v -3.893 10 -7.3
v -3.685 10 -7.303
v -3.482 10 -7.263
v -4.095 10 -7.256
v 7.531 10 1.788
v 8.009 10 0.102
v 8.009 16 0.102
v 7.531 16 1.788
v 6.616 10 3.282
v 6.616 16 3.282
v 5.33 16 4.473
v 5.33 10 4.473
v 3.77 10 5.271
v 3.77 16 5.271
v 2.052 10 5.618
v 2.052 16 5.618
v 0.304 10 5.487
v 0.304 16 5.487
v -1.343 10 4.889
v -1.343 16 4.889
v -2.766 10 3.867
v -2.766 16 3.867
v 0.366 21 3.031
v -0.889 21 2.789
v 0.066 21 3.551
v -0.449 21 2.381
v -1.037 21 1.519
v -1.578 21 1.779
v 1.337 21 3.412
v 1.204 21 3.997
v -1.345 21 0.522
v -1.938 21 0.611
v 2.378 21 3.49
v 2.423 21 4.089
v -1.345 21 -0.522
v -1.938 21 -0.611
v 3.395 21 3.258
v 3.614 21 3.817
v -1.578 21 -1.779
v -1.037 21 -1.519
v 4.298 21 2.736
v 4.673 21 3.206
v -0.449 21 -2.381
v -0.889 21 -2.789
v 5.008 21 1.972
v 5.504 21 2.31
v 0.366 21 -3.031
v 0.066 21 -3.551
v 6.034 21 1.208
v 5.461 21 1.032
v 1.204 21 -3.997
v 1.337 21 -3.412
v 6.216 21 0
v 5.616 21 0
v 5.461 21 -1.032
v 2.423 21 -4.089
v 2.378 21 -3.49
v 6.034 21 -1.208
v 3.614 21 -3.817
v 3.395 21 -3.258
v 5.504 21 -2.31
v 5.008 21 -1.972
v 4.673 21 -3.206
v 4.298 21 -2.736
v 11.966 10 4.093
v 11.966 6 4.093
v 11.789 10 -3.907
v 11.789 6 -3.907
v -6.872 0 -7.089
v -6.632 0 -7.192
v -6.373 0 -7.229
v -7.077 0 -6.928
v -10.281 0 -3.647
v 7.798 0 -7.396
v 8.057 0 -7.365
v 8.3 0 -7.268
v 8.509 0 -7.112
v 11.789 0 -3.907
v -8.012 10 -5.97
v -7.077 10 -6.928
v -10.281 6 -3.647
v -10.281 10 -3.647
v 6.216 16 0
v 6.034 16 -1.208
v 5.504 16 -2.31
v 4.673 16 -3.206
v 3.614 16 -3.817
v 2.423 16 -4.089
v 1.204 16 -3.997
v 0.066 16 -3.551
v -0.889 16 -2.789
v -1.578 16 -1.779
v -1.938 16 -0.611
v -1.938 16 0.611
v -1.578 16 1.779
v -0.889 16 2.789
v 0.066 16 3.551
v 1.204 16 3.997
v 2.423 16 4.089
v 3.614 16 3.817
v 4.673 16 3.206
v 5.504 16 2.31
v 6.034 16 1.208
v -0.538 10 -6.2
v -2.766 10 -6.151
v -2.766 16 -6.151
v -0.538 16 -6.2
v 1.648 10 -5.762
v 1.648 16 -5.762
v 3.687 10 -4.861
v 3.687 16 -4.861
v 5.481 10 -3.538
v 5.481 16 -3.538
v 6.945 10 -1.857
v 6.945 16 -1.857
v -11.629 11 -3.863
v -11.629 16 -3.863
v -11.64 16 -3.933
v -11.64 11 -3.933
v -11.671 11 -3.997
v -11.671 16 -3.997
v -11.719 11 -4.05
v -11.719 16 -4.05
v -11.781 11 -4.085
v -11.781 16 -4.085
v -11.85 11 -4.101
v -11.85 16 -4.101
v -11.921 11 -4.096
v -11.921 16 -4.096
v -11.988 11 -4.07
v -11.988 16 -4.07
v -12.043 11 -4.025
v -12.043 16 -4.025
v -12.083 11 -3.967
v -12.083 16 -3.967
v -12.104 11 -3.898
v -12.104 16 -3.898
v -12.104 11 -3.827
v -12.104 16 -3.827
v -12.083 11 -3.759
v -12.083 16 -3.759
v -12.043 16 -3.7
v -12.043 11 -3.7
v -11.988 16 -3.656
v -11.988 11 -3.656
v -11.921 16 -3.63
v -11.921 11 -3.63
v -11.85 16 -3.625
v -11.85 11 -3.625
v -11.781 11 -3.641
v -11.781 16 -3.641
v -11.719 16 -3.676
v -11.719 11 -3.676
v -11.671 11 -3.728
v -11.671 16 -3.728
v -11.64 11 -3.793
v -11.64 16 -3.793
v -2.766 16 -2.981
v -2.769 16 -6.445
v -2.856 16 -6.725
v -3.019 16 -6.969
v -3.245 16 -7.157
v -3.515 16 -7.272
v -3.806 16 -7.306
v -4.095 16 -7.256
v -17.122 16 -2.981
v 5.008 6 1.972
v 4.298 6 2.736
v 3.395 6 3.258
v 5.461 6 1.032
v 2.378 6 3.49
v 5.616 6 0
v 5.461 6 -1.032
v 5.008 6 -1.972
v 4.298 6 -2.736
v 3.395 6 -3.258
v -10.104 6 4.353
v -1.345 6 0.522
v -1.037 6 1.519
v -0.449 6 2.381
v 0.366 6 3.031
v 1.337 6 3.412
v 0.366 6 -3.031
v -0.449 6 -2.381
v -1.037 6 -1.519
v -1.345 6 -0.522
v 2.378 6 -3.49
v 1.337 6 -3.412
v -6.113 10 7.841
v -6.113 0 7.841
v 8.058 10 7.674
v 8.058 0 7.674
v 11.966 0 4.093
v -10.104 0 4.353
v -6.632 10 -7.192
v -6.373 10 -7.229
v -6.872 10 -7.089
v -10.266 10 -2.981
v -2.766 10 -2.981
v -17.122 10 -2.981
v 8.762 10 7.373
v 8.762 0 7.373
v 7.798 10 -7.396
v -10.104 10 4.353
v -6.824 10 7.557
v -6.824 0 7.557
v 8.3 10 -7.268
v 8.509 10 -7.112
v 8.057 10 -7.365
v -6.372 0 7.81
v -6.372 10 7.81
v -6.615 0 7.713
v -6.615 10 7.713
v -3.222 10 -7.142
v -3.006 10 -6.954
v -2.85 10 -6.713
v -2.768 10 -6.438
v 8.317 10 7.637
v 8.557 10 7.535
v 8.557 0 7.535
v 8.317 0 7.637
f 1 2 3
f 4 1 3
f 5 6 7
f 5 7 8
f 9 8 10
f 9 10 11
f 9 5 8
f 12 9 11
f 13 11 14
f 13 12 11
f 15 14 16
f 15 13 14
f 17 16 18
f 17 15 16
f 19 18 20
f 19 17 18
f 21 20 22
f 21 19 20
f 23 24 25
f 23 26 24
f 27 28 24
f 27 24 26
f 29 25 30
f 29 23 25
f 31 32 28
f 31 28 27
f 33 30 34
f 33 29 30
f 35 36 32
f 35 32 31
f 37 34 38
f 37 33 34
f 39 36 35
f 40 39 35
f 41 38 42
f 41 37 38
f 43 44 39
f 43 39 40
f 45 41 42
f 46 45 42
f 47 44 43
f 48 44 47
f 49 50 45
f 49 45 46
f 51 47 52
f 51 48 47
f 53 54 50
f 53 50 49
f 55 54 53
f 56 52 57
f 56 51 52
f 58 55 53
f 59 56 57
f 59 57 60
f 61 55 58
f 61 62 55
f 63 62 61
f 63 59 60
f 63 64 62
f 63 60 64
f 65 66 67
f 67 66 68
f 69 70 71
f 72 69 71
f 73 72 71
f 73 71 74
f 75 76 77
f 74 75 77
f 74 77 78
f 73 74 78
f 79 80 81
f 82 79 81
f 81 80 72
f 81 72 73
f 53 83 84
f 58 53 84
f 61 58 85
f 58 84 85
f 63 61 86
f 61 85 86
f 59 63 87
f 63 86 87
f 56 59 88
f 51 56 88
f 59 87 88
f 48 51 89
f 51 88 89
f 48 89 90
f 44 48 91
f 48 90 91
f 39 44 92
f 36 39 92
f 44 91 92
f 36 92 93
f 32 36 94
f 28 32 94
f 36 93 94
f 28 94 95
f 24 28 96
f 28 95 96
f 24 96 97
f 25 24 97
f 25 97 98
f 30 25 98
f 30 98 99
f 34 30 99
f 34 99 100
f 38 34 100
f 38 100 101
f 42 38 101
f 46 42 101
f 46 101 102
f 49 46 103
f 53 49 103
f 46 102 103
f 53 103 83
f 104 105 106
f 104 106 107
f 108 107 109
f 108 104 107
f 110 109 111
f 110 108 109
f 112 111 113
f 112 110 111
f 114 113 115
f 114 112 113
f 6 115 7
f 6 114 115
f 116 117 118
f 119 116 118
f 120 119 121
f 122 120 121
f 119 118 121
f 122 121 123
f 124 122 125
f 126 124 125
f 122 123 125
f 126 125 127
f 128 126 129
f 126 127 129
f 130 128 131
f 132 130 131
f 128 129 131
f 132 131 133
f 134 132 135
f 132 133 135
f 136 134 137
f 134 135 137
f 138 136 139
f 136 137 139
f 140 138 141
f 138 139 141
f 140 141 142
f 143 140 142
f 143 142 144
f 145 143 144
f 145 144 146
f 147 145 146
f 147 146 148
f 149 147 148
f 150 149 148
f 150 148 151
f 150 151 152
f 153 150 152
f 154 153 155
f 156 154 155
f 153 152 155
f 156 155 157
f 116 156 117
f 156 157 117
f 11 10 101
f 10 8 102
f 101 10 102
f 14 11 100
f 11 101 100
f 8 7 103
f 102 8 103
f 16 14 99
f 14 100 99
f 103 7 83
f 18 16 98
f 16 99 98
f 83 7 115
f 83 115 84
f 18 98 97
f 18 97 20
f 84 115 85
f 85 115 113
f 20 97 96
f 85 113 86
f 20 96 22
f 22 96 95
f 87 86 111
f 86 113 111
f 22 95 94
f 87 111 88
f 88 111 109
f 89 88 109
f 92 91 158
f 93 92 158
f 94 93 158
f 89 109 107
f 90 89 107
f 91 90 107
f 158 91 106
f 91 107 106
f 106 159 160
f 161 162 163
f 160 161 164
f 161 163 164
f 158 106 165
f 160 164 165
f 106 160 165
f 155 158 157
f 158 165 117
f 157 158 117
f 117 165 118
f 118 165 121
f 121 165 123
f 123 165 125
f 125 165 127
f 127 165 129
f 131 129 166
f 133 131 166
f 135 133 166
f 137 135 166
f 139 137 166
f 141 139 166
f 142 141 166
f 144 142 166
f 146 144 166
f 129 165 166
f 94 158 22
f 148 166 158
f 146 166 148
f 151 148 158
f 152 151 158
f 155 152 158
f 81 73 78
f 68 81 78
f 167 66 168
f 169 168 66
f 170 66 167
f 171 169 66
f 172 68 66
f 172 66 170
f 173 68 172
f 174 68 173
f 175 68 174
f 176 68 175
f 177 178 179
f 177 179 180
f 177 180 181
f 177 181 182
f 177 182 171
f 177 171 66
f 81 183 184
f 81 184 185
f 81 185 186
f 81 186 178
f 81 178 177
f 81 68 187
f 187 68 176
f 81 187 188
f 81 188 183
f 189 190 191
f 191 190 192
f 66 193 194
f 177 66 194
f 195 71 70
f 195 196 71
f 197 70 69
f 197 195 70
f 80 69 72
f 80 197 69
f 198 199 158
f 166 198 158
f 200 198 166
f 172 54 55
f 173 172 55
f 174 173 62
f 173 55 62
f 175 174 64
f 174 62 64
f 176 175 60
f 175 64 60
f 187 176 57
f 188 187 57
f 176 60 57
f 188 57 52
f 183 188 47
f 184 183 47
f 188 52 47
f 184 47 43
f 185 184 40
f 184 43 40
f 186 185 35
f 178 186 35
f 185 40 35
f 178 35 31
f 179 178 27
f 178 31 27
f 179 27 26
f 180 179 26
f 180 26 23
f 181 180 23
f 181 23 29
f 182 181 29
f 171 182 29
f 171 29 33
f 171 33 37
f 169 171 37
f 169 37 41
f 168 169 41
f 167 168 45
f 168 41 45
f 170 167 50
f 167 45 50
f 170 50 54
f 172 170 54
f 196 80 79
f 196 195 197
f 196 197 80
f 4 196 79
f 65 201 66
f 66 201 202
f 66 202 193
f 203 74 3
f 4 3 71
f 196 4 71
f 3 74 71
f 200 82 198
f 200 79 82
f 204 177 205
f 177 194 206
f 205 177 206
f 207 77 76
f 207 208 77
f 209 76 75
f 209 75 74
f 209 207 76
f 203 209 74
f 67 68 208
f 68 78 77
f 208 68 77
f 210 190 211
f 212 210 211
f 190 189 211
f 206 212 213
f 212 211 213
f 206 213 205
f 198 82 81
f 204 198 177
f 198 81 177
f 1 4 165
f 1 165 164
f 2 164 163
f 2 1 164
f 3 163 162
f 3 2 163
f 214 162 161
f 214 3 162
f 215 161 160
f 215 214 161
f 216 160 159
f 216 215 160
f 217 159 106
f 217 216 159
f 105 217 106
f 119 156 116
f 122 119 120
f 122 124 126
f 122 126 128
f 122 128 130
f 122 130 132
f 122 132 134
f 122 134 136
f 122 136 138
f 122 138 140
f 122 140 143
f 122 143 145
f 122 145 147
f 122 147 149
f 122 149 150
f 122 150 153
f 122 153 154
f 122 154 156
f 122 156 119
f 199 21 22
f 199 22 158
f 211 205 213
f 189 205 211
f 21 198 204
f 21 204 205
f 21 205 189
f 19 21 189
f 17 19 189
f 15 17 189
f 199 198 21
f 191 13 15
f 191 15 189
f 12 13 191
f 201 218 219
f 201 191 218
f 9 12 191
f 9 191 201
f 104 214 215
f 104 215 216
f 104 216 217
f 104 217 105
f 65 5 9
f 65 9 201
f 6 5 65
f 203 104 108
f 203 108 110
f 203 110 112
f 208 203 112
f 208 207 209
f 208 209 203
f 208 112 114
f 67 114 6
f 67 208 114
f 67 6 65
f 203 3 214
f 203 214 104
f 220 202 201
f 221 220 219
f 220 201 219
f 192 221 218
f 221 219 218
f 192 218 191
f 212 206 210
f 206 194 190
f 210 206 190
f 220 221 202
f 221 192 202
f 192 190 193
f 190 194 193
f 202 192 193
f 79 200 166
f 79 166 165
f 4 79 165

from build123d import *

# Parameters (mm, degrees)
BOSS_EXTRUDE2_DEPTH = 10
CUT_EXTRUDE2_DEPTH  = 6
BOSS_EXTRUDE4_DEPTH = 6
SKETCH6_R           = 4.1
BOSS_EXTRUDE5_DEPTH = 5
SKETCH8_R           = 3.5
CUT_EXTRUDE3_DEPTH  = 15
SKETCH9_R           = 0.238796938
CUT_EXTRUDE4_DEPTH  = 5
FILLET3_R           = 1
FILLET5_R           = 1


with BuildPart() as part:
    # Sketch1 → Boss-Extrude2 (new body)
    with BuildSketch(Plane(origin=(0, 0, 0), x_dir=(1, 0, 0), z_dir=(0, 1, 0))):
        Polygon((8.212445626, 7.40100076), (-6.787554374, 7.224195263), (-10.281169213, 3.647233513), (-10.104363716, -4.352766487), (-6.527401966, -7.846381326), (8.472598034, -7.669575828), (11.966212872, -4.092614079), (11.789407375, 3.907385921), align=None)
    extrude(amount=BOSS_EXTRUDE2_DEPTH)

    # Sketch4 → Cut-Extrude2 (cut)
    with BuildSketch(Plane(origin=(0, 0, 0), x_dir=(1, 0, 0), z_dir=(0, 1, 0))):
        Polygon((-10.281169213, 3.647233513), (11.789407375, 3.907385921), (11.966212872, -4.092614079), (-10.104363716, -4.352766487), align=None)
    extrude(amount=CUT_EXTRUDE2_DEPTH, mode=Mode.SUBTRACT)

    # Sketch5 → Boss-Extrude4 (add)
    with BuildSketch(Plane(origin=(0, 10, 0), x_dir=(1, 0, 0), z_dir=(0, 1, 0))):
        with BuildLine():
            Line((-17.121590923, 2.980762336), (-4.095095114, 7.255931369))
            ThreePointArc((-4.095095114, 7.255931369), (-3.125179525, 7.071252821), (-2.766206415, 6.151480718))
            ThreePointArc((-2.766206415, 6.151480718), (3.686890427, 4.860901674), (8.008746735, -0.10192123))
            ThreePointArc((8.008746735, -0.10192123), (3.769808673, -5.271440115), (-2.766206415, -3.866794904))
            Line((-2.766206415, -3.866794904), (-2.766206415, 2.980762336))
            Line((-2.766206415, 2.980762336), (-17.121590923, 2.980762336))
        make_face()
    extrude(amount=BOSS_EXTRUDE4_DEPTH)

    # Sketch6 → Boss-Extrude5 (add)
    with BuildSketch(Plane(origin=(0, 16, 0), x_dir=(1, 0, 0), z_dir=(0, 1, 0))):
        with Locations((2.116284808, 0)):
            Circle(SKETCH6_R)
    extrude(amount=BOSS_EXTRUDE5_DEPTH)

    # Sketch8 → Cut-Extrude3 (cut)
    with BuildSketch(Plane(origin=(0, 21, 0), x_dir=(1, 0, 0), z_dir=(0, 1, 0))):
        with Locations((2.116284808, 0)):
            Circle(SKETCH8_R)
    extrude(amount=-CUT_EXTRUDE3_DEPTH, mode=Mode.SUBTRACT)

    # Sketch9 → Cut-Extrude4 (cut)
    with BuildSketch(Plane(origin=(0, 16, 0), x_dir=(1, 0, 0), z_dir=(0, 1, 0))):
        with Locations((-11.868205528, 3.862890266)):
            Circle(SKETCH9_R)
    extrude(amount=-CUT_EXTRUDE4_DEPTH, mode=Mode.SUBTRACT)

    # Fillet3
    fillet3_edges = [part.edges().sort_by_distance(p)[0] for p in [
        (8.472598034, 5, 7.669575828),
    ]]
    fillet(fillet3_edges, radius=FILLET3_R)

    # Fillet5
    fillet5_edges = [part.edges().sort_by_distance(p)[0] for p in [
        (-6.527401966, 5, 7.846381326),
        (-6.787554374, 5, -7.224195263),
        (8.212445626, 5, -7.40100076),
    ]]
    fillet(fillet5_edges, radius=FILLET5_R)


solid = part.part
